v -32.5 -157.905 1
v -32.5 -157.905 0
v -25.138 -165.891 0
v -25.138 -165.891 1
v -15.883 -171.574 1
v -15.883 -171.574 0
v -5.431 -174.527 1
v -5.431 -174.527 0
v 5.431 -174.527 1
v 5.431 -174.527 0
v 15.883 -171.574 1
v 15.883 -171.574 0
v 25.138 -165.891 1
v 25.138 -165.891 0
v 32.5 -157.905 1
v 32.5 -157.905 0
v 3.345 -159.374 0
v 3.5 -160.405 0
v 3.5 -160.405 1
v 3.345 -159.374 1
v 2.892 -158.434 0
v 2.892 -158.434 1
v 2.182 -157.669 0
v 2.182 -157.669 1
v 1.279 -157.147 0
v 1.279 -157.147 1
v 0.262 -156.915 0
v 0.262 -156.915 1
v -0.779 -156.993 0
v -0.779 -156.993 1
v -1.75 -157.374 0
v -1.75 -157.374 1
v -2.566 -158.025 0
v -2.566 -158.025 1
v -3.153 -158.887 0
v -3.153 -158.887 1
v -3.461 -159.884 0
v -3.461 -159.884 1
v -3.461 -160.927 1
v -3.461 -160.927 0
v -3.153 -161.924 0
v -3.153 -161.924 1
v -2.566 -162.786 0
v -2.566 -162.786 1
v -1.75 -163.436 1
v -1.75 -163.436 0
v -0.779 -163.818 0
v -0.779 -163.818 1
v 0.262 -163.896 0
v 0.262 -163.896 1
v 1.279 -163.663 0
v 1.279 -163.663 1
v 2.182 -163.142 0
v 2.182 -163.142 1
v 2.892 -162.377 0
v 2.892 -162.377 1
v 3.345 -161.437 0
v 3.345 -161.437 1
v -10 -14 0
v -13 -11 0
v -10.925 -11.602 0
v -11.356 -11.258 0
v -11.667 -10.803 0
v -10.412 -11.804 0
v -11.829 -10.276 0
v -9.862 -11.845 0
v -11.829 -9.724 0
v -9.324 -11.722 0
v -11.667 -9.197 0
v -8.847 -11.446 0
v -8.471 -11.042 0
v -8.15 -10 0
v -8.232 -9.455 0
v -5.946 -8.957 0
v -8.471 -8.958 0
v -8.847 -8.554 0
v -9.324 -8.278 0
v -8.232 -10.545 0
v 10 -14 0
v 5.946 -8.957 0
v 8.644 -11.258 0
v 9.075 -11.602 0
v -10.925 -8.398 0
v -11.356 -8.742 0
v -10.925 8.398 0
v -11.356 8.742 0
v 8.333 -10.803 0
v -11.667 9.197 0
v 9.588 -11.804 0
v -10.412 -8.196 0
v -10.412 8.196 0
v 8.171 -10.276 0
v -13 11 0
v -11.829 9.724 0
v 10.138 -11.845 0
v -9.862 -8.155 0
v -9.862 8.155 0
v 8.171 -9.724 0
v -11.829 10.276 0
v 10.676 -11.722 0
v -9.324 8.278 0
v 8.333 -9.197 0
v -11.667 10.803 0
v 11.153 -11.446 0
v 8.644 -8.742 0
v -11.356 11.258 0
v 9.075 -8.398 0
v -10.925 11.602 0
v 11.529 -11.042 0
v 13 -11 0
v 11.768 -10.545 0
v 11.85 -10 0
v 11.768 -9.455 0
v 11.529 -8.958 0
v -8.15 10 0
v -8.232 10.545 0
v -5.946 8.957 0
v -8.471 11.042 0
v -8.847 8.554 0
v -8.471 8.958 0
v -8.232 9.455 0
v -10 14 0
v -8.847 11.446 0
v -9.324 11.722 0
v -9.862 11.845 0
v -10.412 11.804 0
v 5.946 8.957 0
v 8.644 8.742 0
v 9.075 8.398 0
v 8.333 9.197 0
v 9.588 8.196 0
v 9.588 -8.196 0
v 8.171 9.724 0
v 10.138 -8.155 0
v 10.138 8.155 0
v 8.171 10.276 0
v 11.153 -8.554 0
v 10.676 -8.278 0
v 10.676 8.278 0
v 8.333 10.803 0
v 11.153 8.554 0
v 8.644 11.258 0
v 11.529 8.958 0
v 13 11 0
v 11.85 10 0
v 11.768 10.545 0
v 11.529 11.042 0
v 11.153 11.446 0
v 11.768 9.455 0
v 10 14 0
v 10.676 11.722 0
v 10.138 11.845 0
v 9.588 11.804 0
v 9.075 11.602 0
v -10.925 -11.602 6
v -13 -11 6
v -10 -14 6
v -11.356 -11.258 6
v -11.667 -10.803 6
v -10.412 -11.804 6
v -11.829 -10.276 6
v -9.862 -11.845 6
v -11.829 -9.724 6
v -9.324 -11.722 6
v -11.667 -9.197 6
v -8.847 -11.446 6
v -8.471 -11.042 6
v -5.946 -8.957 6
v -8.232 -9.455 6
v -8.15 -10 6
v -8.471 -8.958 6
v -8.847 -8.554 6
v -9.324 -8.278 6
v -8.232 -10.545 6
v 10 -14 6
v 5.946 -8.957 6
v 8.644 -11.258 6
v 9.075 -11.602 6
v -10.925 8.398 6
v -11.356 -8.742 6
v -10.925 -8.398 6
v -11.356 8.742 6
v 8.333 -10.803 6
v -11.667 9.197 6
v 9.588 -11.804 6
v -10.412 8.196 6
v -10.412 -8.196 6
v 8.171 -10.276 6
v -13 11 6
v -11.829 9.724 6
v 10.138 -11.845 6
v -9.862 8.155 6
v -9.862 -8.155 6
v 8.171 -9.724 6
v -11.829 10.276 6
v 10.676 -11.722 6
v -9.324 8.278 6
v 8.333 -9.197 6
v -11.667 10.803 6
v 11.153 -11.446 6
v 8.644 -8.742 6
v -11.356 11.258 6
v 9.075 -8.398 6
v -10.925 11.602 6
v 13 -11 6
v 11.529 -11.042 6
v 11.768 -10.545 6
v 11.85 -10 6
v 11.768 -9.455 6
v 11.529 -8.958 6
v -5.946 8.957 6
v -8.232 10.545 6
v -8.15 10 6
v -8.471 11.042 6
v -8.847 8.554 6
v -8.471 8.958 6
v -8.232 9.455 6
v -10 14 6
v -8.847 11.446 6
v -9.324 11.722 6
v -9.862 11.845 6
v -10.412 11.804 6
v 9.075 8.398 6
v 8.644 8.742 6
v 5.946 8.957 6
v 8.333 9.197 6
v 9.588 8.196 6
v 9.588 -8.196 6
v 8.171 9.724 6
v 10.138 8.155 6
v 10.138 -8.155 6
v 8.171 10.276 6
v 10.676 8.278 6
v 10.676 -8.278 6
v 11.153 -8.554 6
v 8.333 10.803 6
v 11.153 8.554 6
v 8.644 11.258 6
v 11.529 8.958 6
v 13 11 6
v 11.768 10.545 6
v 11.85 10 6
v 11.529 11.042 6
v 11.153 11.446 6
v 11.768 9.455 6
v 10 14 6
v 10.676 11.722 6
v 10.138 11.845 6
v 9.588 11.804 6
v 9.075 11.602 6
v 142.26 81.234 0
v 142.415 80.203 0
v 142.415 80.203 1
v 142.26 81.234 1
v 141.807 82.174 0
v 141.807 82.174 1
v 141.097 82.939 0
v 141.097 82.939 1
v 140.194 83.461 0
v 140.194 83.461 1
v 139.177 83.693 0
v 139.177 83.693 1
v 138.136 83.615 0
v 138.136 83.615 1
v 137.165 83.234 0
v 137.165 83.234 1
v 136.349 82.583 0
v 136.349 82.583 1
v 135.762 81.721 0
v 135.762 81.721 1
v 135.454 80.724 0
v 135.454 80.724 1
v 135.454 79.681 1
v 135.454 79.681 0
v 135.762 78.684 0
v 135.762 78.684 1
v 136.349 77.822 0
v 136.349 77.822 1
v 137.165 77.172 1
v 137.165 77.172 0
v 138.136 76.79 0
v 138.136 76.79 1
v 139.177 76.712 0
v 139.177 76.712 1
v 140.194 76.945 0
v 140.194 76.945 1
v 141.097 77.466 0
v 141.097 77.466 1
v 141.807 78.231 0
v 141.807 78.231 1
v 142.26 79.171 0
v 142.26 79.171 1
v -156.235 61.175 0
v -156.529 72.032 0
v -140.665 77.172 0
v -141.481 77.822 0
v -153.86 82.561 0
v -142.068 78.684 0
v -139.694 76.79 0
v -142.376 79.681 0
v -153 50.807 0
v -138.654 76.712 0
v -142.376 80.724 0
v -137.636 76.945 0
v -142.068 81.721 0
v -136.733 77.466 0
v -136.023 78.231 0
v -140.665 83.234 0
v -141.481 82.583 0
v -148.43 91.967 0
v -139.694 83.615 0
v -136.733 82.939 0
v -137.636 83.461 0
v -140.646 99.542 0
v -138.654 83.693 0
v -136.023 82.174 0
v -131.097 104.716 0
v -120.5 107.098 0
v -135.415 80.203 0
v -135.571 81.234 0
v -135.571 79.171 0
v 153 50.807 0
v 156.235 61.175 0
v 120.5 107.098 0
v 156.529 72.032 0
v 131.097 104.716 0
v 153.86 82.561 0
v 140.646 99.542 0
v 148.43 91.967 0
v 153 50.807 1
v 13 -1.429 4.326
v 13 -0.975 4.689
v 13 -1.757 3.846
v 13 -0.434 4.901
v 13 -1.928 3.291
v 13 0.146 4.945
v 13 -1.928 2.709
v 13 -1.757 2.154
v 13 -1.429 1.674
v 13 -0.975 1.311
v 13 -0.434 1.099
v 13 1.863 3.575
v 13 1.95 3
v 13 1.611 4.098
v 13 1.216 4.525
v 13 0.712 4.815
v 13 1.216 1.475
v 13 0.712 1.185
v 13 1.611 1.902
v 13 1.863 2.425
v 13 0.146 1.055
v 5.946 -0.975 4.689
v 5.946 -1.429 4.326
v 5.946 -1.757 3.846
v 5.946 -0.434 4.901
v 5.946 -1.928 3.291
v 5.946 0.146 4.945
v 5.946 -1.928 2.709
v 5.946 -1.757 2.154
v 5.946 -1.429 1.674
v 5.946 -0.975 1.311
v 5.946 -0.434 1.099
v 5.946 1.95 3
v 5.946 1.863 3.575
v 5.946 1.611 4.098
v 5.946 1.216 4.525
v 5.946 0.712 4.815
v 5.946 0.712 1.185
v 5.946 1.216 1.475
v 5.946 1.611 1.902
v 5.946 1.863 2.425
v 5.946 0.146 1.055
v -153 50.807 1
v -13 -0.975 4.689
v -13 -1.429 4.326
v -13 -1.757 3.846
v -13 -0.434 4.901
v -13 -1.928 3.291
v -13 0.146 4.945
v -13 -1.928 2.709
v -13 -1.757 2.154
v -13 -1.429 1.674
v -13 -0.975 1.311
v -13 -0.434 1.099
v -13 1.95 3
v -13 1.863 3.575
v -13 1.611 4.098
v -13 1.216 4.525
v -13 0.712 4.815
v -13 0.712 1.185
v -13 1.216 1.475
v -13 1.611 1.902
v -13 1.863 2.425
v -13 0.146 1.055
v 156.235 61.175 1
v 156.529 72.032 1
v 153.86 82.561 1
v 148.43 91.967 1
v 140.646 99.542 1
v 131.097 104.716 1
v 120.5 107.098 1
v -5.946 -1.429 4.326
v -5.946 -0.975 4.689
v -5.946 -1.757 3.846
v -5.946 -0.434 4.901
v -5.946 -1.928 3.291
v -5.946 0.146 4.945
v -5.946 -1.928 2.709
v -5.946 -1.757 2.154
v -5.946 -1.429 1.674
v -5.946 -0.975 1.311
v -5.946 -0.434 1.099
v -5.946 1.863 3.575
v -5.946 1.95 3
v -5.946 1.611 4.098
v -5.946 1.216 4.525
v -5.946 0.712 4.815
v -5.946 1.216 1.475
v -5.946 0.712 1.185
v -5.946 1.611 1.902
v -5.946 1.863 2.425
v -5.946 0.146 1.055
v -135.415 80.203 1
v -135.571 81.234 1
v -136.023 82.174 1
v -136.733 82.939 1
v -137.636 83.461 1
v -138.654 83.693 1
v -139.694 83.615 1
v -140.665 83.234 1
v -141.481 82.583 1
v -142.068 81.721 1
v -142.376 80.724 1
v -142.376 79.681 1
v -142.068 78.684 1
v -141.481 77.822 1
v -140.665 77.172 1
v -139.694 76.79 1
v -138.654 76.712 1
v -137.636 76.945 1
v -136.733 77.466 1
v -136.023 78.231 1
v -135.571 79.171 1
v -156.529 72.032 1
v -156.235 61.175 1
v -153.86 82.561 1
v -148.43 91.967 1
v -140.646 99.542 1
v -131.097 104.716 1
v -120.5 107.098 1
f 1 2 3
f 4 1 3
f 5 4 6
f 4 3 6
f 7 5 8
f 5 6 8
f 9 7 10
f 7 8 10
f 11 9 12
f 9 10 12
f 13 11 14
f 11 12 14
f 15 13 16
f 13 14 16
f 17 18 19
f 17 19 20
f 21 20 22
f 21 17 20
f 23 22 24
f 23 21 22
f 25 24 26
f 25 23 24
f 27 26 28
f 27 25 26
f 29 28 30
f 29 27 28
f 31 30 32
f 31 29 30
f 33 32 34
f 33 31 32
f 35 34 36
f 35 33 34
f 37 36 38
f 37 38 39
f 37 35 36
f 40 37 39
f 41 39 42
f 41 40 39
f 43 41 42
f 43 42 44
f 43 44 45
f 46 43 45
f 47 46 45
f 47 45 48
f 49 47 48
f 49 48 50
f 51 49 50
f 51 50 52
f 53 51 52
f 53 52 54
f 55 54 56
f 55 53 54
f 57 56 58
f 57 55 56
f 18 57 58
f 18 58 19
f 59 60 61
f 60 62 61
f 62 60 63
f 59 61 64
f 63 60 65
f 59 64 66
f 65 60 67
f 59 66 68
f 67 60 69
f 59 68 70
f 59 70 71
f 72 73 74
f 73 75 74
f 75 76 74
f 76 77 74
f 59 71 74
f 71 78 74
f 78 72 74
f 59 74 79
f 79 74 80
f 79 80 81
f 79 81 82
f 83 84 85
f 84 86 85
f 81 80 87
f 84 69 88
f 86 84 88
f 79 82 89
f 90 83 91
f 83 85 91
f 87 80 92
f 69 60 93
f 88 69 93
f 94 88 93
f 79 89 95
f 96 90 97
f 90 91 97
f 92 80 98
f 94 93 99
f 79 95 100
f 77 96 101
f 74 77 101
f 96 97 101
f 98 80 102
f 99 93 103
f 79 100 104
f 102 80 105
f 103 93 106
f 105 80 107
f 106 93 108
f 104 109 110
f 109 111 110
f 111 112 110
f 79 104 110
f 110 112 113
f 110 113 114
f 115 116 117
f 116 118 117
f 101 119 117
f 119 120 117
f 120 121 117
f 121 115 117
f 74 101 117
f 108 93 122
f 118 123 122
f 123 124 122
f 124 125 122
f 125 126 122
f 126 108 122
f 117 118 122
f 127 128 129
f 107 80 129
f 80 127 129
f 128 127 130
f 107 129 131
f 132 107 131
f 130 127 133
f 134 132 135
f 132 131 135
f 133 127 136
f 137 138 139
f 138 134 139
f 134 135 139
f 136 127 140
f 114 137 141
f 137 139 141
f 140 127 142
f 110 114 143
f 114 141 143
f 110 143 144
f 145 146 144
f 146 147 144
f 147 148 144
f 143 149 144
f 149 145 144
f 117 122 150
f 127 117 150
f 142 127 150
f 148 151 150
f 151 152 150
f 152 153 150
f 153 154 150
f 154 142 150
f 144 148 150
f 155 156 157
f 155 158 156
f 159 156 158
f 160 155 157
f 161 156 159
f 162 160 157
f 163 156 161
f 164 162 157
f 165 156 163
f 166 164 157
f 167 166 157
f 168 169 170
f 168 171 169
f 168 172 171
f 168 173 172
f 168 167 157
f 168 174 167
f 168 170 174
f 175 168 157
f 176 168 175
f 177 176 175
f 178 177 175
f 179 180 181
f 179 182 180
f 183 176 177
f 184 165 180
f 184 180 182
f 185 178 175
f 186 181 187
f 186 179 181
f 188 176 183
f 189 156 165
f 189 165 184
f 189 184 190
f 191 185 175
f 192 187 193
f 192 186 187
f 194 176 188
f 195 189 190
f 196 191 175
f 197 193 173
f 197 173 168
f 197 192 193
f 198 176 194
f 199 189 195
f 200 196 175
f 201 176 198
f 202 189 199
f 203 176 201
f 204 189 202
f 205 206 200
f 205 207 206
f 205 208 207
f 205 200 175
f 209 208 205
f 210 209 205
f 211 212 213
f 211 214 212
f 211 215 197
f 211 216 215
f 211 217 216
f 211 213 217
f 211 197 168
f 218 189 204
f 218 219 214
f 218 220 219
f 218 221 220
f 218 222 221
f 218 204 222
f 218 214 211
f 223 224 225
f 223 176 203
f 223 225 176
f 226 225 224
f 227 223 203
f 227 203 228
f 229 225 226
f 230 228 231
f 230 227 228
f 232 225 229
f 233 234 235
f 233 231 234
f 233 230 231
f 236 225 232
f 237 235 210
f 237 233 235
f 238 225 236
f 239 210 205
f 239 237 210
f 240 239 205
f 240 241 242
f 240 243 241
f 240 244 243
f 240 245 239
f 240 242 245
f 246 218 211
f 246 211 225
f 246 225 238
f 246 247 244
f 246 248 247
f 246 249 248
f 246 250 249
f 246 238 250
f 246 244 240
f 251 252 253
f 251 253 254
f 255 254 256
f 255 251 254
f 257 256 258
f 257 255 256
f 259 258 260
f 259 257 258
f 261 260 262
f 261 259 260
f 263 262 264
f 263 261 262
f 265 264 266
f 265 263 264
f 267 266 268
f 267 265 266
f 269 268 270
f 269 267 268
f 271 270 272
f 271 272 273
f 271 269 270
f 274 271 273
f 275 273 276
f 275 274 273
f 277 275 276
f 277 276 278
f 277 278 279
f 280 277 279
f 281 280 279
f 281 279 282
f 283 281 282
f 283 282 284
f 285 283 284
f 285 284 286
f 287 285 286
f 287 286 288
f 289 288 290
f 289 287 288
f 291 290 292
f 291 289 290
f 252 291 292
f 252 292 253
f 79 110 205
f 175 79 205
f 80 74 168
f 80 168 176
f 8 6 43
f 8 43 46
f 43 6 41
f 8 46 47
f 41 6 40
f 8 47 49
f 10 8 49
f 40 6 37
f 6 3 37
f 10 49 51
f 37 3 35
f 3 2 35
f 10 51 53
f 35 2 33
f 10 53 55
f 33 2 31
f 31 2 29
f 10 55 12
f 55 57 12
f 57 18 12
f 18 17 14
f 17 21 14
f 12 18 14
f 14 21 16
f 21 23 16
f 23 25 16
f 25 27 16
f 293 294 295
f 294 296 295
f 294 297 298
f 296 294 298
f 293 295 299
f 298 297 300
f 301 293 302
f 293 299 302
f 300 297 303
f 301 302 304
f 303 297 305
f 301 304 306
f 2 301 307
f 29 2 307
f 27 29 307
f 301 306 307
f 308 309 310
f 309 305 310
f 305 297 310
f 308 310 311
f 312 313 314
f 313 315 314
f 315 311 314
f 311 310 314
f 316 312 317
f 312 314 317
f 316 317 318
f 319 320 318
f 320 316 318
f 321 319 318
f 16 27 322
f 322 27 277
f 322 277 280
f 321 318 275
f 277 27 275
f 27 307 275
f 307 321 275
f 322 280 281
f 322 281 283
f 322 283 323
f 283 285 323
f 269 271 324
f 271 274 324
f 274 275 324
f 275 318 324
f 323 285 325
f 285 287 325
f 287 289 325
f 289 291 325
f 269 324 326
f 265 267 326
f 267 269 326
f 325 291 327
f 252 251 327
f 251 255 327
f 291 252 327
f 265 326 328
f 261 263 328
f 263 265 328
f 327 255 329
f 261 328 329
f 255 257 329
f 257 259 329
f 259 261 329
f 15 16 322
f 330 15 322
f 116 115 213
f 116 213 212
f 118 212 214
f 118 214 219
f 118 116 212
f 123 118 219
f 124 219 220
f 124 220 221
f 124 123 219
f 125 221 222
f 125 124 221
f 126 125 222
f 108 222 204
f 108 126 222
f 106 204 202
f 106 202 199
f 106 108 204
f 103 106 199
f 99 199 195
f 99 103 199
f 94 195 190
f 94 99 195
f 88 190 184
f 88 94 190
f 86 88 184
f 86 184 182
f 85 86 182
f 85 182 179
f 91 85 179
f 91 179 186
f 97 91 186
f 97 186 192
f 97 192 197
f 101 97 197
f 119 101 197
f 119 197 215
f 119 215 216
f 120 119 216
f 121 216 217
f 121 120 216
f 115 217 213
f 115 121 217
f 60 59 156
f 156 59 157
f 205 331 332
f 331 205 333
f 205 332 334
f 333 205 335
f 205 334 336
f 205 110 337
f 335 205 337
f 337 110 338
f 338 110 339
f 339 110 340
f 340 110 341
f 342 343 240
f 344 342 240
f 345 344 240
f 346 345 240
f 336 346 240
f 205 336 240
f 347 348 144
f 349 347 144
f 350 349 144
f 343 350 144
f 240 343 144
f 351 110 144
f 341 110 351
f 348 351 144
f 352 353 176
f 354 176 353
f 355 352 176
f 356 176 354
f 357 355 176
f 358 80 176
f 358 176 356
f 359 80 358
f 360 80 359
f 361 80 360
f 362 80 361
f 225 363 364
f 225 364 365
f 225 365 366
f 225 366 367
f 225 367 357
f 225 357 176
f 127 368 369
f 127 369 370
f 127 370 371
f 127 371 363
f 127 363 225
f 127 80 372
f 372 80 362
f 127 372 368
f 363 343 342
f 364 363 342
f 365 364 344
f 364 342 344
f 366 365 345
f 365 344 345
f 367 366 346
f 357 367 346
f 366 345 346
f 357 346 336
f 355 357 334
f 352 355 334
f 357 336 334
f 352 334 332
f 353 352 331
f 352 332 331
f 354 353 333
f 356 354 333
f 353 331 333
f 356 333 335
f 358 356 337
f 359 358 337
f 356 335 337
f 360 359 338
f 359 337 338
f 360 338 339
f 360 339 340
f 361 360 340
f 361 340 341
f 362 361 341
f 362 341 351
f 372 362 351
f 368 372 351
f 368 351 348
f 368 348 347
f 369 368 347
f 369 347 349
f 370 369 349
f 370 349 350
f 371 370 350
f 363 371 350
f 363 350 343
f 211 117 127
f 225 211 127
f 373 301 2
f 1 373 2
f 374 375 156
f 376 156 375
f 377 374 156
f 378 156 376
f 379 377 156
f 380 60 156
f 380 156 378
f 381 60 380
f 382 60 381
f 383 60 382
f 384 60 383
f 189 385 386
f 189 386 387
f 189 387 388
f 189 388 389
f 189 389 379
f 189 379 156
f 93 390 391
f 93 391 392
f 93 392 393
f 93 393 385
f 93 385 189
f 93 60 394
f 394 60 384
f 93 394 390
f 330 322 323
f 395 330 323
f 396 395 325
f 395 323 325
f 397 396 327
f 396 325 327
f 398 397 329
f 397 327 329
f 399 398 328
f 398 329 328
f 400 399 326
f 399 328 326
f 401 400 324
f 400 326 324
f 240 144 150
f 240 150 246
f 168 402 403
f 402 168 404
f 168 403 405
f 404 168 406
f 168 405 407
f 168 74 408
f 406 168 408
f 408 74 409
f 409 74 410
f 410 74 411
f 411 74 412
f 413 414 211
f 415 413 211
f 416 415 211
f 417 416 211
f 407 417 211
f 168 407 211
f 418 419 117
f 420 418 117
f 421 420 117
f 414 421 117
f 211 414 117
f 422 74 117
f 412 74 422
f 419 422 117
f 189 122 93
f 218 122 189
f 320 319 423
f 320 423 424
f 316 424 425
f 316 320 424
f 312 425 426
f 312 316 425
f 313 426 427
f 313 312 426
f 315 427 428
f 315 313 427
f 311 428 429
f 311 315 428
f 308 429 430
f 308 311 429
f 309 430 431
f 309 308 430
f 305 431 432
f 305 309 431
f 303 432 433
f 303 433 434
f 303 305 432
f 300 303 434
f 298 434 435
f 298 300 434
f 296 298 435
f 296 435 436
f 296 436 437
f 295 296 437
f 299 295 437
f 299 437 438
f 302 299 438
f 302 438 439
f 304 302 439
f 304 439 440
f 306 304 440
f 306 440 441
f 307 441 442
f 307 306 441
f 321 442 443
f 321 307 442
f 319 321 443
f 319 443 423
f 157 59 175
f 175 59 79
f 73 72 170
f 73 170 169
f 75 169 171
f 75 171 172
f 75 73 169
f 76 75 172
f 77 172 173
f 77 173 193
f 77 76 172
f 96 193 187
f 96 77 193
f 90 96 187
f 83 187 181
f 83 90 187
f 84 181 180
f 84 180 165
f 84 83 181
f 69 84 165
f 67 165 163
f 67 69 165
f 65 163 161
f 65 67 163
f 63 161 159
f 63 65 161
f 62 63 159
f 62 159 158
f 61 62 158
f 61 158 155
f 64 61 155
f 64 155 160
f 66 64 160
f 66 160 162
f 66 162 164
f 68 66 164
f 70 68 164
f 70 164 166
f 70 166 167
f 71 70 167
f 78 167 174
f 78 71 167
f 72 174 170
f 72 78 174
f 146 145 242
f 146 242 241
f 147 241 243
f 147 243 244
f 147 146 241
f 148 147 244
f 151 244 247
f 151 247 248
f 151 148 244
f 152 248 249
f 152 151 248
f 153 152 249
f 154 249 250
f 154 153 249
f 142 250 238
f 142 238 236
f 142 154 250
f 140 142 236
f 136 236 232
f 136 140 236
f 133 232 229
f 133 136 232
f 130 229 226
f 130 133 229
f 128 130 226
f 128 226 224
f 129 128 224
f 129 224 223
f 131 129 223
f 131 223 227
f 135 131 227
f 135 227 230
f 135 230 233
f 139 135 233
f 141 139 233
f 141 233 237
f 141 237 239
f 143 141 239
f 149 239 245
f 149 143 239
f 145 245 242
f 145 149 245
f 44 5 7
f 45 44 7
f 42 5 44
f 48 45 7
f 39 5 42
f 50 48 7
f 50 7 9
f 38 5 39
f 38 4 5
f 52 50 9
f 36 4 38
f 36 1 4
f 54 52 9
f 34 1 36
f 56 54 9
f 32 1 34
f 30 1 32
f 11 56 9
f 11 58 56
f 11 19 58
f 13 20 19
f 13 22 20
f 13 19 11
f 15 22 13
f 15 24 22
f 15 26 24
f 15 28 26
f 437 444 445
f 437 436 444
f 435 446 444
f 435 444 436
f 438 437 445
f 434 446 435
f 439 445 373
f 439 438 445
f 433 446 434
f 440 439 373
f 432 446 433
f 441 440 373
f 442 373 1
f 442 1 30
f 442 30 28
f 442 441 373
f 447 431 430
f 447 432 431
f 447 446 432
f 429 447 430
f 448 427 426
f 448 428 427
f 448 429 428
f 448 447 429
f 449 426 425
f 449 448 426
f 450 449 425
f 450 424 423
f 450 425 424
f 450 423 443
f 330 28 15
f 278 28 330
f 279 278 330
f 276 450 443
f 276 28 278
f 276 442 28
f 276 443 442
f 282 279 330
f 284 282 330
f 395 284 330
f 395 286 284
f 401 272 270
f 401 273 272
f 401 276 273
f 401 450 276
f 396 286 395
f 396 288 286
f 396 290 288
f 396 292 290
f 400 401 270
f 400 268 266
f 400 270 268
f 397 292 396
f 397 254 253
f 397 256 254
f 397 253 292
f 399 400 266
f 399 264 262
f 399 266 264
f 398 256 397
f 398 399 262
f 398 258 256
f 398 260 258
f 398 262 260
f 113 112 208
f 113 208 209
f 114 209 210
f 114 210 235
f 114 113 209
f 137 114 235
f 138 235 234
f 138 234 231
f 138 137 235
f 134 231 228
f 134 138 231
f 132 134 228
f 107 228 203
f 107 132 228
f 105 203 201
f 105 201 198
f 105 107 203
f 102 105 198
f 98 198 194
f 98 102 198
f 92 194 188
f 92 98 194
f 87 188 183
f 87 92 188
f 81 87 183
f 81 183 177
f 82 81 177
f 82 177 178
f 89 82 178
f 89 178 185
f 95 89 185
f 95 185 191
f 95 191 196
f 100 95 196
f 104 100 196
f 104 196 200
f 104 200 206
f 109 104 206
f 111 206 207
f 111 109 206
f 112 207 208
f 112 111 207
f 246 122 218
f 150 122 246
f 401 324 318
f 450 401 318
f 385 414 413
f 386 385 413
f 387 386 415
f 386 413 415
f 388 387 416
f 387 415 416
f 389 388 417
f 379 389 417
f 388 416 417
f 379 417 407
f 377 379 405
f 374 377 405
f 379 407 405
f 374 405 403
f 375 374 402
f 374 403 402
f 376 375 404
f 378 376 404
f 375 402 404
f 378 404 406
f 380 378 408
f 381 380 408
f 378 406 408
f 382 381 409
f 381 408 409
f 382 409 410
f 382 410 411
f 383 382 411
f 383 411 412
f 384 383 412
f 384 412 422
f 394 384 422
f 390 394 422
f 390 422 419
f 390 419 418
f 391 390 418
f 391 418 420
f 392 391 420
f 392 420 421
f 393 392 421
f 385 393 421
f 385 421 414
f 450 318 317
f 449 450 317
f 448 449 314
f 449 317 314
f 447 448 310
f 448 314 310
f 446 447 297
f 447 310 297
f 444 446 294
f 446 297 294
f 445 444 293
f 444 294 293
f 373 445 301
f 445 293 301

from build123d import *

# Parameters (mm, degrees)
F0_R     = 3.5
F1_DEPTH = 1
F2_W     = 26
F2_H     = 28
F2_R     = 1.85
F2_W_2   = 11.891704
F2_H_2   = 17.913576
F3_DEPTH = 6
F5_D     = 3.9
F5_DEPTH = 45
F6_SIZE  = 3


with BuildPart() as f1:
    # F0 (on Top) → F1 (new body)
    with BuildSketch(Plane.XY):
        with BuildLine():
            Line((120.5, 107.098475), (-120.5, 107.098475))
            ThreePointArc((-120.5, 107.098475), (-151.469164, 87.450763), (-153, 50.806824))
            Line((-153, 50.806824), (-32.5, -157.905299))
            ThreePointArc((-32.5, -157.905299), (0, -174.901525), (32.5, -157.905299))
            Line((32.5, -157.905299), (153, 50.806824))
            ThreePointArc((153, 50.806824), (151.469164, 87.450763), (120.5, 107.098475))
        make_face()
        with Locations((0, -160.405299)):
            Circle(F0_R, mode=Mode.SUBTRACT)
        with Locations((-138.915064, 80.202649)):
            Circle(F0_R, mode=Mode.SUBTRACT)
        with Locations((138.915064, 80.202649)):
            Circle(F0_R, mode=Mode.SUBTRACT)
    extrude(amount=F1_DEPTH)


with BuildPart() as f3:
    # F2 (on Top) → F3 (new body)
    with BuildSketch(Plane.XY):
        Rectangle(F2_W, F2_H)
        with Locations((-10, -10)):
            Circle(F2_R, mode=Mode.SUBTRACT)
        with Locations((10, -10)):
            Circle(F2_R, mode=Mode.SUBTRACT)
        with Locations((-10, 10)):
            Circle(F2_R, mode=Mode.SUBTRACT)
        Rectangle(F2_W_2, F2_H_2, mode=Mode.SUBTRACT)
        with Locations((10, 10)):
            Circle(F2_R, mode=Mode.SUBTRACT)
    extrude(amount=F3_DEPTH)

    # F5
    with Locations(Plane(origin=(-13, 0, 0), x_dir=(0, -1, 0), z_dir=(-1, 0, 0))):
        with Locations((0, 3)):
            Hole(F5_D / 2, depth=F5_DEPTH)

    # F6
    f6_edges = [f3.edges().sort_by_distance(p)[0] for p in [
        (-13, 14, 3),
        (13, 14, 3),
        (-13, -14, 3),
        (13, -14, 3),
    ]]
    chamfer(f6_edges, length=F6_SIZE)


solid = Compound([f1.part, f3.part])
